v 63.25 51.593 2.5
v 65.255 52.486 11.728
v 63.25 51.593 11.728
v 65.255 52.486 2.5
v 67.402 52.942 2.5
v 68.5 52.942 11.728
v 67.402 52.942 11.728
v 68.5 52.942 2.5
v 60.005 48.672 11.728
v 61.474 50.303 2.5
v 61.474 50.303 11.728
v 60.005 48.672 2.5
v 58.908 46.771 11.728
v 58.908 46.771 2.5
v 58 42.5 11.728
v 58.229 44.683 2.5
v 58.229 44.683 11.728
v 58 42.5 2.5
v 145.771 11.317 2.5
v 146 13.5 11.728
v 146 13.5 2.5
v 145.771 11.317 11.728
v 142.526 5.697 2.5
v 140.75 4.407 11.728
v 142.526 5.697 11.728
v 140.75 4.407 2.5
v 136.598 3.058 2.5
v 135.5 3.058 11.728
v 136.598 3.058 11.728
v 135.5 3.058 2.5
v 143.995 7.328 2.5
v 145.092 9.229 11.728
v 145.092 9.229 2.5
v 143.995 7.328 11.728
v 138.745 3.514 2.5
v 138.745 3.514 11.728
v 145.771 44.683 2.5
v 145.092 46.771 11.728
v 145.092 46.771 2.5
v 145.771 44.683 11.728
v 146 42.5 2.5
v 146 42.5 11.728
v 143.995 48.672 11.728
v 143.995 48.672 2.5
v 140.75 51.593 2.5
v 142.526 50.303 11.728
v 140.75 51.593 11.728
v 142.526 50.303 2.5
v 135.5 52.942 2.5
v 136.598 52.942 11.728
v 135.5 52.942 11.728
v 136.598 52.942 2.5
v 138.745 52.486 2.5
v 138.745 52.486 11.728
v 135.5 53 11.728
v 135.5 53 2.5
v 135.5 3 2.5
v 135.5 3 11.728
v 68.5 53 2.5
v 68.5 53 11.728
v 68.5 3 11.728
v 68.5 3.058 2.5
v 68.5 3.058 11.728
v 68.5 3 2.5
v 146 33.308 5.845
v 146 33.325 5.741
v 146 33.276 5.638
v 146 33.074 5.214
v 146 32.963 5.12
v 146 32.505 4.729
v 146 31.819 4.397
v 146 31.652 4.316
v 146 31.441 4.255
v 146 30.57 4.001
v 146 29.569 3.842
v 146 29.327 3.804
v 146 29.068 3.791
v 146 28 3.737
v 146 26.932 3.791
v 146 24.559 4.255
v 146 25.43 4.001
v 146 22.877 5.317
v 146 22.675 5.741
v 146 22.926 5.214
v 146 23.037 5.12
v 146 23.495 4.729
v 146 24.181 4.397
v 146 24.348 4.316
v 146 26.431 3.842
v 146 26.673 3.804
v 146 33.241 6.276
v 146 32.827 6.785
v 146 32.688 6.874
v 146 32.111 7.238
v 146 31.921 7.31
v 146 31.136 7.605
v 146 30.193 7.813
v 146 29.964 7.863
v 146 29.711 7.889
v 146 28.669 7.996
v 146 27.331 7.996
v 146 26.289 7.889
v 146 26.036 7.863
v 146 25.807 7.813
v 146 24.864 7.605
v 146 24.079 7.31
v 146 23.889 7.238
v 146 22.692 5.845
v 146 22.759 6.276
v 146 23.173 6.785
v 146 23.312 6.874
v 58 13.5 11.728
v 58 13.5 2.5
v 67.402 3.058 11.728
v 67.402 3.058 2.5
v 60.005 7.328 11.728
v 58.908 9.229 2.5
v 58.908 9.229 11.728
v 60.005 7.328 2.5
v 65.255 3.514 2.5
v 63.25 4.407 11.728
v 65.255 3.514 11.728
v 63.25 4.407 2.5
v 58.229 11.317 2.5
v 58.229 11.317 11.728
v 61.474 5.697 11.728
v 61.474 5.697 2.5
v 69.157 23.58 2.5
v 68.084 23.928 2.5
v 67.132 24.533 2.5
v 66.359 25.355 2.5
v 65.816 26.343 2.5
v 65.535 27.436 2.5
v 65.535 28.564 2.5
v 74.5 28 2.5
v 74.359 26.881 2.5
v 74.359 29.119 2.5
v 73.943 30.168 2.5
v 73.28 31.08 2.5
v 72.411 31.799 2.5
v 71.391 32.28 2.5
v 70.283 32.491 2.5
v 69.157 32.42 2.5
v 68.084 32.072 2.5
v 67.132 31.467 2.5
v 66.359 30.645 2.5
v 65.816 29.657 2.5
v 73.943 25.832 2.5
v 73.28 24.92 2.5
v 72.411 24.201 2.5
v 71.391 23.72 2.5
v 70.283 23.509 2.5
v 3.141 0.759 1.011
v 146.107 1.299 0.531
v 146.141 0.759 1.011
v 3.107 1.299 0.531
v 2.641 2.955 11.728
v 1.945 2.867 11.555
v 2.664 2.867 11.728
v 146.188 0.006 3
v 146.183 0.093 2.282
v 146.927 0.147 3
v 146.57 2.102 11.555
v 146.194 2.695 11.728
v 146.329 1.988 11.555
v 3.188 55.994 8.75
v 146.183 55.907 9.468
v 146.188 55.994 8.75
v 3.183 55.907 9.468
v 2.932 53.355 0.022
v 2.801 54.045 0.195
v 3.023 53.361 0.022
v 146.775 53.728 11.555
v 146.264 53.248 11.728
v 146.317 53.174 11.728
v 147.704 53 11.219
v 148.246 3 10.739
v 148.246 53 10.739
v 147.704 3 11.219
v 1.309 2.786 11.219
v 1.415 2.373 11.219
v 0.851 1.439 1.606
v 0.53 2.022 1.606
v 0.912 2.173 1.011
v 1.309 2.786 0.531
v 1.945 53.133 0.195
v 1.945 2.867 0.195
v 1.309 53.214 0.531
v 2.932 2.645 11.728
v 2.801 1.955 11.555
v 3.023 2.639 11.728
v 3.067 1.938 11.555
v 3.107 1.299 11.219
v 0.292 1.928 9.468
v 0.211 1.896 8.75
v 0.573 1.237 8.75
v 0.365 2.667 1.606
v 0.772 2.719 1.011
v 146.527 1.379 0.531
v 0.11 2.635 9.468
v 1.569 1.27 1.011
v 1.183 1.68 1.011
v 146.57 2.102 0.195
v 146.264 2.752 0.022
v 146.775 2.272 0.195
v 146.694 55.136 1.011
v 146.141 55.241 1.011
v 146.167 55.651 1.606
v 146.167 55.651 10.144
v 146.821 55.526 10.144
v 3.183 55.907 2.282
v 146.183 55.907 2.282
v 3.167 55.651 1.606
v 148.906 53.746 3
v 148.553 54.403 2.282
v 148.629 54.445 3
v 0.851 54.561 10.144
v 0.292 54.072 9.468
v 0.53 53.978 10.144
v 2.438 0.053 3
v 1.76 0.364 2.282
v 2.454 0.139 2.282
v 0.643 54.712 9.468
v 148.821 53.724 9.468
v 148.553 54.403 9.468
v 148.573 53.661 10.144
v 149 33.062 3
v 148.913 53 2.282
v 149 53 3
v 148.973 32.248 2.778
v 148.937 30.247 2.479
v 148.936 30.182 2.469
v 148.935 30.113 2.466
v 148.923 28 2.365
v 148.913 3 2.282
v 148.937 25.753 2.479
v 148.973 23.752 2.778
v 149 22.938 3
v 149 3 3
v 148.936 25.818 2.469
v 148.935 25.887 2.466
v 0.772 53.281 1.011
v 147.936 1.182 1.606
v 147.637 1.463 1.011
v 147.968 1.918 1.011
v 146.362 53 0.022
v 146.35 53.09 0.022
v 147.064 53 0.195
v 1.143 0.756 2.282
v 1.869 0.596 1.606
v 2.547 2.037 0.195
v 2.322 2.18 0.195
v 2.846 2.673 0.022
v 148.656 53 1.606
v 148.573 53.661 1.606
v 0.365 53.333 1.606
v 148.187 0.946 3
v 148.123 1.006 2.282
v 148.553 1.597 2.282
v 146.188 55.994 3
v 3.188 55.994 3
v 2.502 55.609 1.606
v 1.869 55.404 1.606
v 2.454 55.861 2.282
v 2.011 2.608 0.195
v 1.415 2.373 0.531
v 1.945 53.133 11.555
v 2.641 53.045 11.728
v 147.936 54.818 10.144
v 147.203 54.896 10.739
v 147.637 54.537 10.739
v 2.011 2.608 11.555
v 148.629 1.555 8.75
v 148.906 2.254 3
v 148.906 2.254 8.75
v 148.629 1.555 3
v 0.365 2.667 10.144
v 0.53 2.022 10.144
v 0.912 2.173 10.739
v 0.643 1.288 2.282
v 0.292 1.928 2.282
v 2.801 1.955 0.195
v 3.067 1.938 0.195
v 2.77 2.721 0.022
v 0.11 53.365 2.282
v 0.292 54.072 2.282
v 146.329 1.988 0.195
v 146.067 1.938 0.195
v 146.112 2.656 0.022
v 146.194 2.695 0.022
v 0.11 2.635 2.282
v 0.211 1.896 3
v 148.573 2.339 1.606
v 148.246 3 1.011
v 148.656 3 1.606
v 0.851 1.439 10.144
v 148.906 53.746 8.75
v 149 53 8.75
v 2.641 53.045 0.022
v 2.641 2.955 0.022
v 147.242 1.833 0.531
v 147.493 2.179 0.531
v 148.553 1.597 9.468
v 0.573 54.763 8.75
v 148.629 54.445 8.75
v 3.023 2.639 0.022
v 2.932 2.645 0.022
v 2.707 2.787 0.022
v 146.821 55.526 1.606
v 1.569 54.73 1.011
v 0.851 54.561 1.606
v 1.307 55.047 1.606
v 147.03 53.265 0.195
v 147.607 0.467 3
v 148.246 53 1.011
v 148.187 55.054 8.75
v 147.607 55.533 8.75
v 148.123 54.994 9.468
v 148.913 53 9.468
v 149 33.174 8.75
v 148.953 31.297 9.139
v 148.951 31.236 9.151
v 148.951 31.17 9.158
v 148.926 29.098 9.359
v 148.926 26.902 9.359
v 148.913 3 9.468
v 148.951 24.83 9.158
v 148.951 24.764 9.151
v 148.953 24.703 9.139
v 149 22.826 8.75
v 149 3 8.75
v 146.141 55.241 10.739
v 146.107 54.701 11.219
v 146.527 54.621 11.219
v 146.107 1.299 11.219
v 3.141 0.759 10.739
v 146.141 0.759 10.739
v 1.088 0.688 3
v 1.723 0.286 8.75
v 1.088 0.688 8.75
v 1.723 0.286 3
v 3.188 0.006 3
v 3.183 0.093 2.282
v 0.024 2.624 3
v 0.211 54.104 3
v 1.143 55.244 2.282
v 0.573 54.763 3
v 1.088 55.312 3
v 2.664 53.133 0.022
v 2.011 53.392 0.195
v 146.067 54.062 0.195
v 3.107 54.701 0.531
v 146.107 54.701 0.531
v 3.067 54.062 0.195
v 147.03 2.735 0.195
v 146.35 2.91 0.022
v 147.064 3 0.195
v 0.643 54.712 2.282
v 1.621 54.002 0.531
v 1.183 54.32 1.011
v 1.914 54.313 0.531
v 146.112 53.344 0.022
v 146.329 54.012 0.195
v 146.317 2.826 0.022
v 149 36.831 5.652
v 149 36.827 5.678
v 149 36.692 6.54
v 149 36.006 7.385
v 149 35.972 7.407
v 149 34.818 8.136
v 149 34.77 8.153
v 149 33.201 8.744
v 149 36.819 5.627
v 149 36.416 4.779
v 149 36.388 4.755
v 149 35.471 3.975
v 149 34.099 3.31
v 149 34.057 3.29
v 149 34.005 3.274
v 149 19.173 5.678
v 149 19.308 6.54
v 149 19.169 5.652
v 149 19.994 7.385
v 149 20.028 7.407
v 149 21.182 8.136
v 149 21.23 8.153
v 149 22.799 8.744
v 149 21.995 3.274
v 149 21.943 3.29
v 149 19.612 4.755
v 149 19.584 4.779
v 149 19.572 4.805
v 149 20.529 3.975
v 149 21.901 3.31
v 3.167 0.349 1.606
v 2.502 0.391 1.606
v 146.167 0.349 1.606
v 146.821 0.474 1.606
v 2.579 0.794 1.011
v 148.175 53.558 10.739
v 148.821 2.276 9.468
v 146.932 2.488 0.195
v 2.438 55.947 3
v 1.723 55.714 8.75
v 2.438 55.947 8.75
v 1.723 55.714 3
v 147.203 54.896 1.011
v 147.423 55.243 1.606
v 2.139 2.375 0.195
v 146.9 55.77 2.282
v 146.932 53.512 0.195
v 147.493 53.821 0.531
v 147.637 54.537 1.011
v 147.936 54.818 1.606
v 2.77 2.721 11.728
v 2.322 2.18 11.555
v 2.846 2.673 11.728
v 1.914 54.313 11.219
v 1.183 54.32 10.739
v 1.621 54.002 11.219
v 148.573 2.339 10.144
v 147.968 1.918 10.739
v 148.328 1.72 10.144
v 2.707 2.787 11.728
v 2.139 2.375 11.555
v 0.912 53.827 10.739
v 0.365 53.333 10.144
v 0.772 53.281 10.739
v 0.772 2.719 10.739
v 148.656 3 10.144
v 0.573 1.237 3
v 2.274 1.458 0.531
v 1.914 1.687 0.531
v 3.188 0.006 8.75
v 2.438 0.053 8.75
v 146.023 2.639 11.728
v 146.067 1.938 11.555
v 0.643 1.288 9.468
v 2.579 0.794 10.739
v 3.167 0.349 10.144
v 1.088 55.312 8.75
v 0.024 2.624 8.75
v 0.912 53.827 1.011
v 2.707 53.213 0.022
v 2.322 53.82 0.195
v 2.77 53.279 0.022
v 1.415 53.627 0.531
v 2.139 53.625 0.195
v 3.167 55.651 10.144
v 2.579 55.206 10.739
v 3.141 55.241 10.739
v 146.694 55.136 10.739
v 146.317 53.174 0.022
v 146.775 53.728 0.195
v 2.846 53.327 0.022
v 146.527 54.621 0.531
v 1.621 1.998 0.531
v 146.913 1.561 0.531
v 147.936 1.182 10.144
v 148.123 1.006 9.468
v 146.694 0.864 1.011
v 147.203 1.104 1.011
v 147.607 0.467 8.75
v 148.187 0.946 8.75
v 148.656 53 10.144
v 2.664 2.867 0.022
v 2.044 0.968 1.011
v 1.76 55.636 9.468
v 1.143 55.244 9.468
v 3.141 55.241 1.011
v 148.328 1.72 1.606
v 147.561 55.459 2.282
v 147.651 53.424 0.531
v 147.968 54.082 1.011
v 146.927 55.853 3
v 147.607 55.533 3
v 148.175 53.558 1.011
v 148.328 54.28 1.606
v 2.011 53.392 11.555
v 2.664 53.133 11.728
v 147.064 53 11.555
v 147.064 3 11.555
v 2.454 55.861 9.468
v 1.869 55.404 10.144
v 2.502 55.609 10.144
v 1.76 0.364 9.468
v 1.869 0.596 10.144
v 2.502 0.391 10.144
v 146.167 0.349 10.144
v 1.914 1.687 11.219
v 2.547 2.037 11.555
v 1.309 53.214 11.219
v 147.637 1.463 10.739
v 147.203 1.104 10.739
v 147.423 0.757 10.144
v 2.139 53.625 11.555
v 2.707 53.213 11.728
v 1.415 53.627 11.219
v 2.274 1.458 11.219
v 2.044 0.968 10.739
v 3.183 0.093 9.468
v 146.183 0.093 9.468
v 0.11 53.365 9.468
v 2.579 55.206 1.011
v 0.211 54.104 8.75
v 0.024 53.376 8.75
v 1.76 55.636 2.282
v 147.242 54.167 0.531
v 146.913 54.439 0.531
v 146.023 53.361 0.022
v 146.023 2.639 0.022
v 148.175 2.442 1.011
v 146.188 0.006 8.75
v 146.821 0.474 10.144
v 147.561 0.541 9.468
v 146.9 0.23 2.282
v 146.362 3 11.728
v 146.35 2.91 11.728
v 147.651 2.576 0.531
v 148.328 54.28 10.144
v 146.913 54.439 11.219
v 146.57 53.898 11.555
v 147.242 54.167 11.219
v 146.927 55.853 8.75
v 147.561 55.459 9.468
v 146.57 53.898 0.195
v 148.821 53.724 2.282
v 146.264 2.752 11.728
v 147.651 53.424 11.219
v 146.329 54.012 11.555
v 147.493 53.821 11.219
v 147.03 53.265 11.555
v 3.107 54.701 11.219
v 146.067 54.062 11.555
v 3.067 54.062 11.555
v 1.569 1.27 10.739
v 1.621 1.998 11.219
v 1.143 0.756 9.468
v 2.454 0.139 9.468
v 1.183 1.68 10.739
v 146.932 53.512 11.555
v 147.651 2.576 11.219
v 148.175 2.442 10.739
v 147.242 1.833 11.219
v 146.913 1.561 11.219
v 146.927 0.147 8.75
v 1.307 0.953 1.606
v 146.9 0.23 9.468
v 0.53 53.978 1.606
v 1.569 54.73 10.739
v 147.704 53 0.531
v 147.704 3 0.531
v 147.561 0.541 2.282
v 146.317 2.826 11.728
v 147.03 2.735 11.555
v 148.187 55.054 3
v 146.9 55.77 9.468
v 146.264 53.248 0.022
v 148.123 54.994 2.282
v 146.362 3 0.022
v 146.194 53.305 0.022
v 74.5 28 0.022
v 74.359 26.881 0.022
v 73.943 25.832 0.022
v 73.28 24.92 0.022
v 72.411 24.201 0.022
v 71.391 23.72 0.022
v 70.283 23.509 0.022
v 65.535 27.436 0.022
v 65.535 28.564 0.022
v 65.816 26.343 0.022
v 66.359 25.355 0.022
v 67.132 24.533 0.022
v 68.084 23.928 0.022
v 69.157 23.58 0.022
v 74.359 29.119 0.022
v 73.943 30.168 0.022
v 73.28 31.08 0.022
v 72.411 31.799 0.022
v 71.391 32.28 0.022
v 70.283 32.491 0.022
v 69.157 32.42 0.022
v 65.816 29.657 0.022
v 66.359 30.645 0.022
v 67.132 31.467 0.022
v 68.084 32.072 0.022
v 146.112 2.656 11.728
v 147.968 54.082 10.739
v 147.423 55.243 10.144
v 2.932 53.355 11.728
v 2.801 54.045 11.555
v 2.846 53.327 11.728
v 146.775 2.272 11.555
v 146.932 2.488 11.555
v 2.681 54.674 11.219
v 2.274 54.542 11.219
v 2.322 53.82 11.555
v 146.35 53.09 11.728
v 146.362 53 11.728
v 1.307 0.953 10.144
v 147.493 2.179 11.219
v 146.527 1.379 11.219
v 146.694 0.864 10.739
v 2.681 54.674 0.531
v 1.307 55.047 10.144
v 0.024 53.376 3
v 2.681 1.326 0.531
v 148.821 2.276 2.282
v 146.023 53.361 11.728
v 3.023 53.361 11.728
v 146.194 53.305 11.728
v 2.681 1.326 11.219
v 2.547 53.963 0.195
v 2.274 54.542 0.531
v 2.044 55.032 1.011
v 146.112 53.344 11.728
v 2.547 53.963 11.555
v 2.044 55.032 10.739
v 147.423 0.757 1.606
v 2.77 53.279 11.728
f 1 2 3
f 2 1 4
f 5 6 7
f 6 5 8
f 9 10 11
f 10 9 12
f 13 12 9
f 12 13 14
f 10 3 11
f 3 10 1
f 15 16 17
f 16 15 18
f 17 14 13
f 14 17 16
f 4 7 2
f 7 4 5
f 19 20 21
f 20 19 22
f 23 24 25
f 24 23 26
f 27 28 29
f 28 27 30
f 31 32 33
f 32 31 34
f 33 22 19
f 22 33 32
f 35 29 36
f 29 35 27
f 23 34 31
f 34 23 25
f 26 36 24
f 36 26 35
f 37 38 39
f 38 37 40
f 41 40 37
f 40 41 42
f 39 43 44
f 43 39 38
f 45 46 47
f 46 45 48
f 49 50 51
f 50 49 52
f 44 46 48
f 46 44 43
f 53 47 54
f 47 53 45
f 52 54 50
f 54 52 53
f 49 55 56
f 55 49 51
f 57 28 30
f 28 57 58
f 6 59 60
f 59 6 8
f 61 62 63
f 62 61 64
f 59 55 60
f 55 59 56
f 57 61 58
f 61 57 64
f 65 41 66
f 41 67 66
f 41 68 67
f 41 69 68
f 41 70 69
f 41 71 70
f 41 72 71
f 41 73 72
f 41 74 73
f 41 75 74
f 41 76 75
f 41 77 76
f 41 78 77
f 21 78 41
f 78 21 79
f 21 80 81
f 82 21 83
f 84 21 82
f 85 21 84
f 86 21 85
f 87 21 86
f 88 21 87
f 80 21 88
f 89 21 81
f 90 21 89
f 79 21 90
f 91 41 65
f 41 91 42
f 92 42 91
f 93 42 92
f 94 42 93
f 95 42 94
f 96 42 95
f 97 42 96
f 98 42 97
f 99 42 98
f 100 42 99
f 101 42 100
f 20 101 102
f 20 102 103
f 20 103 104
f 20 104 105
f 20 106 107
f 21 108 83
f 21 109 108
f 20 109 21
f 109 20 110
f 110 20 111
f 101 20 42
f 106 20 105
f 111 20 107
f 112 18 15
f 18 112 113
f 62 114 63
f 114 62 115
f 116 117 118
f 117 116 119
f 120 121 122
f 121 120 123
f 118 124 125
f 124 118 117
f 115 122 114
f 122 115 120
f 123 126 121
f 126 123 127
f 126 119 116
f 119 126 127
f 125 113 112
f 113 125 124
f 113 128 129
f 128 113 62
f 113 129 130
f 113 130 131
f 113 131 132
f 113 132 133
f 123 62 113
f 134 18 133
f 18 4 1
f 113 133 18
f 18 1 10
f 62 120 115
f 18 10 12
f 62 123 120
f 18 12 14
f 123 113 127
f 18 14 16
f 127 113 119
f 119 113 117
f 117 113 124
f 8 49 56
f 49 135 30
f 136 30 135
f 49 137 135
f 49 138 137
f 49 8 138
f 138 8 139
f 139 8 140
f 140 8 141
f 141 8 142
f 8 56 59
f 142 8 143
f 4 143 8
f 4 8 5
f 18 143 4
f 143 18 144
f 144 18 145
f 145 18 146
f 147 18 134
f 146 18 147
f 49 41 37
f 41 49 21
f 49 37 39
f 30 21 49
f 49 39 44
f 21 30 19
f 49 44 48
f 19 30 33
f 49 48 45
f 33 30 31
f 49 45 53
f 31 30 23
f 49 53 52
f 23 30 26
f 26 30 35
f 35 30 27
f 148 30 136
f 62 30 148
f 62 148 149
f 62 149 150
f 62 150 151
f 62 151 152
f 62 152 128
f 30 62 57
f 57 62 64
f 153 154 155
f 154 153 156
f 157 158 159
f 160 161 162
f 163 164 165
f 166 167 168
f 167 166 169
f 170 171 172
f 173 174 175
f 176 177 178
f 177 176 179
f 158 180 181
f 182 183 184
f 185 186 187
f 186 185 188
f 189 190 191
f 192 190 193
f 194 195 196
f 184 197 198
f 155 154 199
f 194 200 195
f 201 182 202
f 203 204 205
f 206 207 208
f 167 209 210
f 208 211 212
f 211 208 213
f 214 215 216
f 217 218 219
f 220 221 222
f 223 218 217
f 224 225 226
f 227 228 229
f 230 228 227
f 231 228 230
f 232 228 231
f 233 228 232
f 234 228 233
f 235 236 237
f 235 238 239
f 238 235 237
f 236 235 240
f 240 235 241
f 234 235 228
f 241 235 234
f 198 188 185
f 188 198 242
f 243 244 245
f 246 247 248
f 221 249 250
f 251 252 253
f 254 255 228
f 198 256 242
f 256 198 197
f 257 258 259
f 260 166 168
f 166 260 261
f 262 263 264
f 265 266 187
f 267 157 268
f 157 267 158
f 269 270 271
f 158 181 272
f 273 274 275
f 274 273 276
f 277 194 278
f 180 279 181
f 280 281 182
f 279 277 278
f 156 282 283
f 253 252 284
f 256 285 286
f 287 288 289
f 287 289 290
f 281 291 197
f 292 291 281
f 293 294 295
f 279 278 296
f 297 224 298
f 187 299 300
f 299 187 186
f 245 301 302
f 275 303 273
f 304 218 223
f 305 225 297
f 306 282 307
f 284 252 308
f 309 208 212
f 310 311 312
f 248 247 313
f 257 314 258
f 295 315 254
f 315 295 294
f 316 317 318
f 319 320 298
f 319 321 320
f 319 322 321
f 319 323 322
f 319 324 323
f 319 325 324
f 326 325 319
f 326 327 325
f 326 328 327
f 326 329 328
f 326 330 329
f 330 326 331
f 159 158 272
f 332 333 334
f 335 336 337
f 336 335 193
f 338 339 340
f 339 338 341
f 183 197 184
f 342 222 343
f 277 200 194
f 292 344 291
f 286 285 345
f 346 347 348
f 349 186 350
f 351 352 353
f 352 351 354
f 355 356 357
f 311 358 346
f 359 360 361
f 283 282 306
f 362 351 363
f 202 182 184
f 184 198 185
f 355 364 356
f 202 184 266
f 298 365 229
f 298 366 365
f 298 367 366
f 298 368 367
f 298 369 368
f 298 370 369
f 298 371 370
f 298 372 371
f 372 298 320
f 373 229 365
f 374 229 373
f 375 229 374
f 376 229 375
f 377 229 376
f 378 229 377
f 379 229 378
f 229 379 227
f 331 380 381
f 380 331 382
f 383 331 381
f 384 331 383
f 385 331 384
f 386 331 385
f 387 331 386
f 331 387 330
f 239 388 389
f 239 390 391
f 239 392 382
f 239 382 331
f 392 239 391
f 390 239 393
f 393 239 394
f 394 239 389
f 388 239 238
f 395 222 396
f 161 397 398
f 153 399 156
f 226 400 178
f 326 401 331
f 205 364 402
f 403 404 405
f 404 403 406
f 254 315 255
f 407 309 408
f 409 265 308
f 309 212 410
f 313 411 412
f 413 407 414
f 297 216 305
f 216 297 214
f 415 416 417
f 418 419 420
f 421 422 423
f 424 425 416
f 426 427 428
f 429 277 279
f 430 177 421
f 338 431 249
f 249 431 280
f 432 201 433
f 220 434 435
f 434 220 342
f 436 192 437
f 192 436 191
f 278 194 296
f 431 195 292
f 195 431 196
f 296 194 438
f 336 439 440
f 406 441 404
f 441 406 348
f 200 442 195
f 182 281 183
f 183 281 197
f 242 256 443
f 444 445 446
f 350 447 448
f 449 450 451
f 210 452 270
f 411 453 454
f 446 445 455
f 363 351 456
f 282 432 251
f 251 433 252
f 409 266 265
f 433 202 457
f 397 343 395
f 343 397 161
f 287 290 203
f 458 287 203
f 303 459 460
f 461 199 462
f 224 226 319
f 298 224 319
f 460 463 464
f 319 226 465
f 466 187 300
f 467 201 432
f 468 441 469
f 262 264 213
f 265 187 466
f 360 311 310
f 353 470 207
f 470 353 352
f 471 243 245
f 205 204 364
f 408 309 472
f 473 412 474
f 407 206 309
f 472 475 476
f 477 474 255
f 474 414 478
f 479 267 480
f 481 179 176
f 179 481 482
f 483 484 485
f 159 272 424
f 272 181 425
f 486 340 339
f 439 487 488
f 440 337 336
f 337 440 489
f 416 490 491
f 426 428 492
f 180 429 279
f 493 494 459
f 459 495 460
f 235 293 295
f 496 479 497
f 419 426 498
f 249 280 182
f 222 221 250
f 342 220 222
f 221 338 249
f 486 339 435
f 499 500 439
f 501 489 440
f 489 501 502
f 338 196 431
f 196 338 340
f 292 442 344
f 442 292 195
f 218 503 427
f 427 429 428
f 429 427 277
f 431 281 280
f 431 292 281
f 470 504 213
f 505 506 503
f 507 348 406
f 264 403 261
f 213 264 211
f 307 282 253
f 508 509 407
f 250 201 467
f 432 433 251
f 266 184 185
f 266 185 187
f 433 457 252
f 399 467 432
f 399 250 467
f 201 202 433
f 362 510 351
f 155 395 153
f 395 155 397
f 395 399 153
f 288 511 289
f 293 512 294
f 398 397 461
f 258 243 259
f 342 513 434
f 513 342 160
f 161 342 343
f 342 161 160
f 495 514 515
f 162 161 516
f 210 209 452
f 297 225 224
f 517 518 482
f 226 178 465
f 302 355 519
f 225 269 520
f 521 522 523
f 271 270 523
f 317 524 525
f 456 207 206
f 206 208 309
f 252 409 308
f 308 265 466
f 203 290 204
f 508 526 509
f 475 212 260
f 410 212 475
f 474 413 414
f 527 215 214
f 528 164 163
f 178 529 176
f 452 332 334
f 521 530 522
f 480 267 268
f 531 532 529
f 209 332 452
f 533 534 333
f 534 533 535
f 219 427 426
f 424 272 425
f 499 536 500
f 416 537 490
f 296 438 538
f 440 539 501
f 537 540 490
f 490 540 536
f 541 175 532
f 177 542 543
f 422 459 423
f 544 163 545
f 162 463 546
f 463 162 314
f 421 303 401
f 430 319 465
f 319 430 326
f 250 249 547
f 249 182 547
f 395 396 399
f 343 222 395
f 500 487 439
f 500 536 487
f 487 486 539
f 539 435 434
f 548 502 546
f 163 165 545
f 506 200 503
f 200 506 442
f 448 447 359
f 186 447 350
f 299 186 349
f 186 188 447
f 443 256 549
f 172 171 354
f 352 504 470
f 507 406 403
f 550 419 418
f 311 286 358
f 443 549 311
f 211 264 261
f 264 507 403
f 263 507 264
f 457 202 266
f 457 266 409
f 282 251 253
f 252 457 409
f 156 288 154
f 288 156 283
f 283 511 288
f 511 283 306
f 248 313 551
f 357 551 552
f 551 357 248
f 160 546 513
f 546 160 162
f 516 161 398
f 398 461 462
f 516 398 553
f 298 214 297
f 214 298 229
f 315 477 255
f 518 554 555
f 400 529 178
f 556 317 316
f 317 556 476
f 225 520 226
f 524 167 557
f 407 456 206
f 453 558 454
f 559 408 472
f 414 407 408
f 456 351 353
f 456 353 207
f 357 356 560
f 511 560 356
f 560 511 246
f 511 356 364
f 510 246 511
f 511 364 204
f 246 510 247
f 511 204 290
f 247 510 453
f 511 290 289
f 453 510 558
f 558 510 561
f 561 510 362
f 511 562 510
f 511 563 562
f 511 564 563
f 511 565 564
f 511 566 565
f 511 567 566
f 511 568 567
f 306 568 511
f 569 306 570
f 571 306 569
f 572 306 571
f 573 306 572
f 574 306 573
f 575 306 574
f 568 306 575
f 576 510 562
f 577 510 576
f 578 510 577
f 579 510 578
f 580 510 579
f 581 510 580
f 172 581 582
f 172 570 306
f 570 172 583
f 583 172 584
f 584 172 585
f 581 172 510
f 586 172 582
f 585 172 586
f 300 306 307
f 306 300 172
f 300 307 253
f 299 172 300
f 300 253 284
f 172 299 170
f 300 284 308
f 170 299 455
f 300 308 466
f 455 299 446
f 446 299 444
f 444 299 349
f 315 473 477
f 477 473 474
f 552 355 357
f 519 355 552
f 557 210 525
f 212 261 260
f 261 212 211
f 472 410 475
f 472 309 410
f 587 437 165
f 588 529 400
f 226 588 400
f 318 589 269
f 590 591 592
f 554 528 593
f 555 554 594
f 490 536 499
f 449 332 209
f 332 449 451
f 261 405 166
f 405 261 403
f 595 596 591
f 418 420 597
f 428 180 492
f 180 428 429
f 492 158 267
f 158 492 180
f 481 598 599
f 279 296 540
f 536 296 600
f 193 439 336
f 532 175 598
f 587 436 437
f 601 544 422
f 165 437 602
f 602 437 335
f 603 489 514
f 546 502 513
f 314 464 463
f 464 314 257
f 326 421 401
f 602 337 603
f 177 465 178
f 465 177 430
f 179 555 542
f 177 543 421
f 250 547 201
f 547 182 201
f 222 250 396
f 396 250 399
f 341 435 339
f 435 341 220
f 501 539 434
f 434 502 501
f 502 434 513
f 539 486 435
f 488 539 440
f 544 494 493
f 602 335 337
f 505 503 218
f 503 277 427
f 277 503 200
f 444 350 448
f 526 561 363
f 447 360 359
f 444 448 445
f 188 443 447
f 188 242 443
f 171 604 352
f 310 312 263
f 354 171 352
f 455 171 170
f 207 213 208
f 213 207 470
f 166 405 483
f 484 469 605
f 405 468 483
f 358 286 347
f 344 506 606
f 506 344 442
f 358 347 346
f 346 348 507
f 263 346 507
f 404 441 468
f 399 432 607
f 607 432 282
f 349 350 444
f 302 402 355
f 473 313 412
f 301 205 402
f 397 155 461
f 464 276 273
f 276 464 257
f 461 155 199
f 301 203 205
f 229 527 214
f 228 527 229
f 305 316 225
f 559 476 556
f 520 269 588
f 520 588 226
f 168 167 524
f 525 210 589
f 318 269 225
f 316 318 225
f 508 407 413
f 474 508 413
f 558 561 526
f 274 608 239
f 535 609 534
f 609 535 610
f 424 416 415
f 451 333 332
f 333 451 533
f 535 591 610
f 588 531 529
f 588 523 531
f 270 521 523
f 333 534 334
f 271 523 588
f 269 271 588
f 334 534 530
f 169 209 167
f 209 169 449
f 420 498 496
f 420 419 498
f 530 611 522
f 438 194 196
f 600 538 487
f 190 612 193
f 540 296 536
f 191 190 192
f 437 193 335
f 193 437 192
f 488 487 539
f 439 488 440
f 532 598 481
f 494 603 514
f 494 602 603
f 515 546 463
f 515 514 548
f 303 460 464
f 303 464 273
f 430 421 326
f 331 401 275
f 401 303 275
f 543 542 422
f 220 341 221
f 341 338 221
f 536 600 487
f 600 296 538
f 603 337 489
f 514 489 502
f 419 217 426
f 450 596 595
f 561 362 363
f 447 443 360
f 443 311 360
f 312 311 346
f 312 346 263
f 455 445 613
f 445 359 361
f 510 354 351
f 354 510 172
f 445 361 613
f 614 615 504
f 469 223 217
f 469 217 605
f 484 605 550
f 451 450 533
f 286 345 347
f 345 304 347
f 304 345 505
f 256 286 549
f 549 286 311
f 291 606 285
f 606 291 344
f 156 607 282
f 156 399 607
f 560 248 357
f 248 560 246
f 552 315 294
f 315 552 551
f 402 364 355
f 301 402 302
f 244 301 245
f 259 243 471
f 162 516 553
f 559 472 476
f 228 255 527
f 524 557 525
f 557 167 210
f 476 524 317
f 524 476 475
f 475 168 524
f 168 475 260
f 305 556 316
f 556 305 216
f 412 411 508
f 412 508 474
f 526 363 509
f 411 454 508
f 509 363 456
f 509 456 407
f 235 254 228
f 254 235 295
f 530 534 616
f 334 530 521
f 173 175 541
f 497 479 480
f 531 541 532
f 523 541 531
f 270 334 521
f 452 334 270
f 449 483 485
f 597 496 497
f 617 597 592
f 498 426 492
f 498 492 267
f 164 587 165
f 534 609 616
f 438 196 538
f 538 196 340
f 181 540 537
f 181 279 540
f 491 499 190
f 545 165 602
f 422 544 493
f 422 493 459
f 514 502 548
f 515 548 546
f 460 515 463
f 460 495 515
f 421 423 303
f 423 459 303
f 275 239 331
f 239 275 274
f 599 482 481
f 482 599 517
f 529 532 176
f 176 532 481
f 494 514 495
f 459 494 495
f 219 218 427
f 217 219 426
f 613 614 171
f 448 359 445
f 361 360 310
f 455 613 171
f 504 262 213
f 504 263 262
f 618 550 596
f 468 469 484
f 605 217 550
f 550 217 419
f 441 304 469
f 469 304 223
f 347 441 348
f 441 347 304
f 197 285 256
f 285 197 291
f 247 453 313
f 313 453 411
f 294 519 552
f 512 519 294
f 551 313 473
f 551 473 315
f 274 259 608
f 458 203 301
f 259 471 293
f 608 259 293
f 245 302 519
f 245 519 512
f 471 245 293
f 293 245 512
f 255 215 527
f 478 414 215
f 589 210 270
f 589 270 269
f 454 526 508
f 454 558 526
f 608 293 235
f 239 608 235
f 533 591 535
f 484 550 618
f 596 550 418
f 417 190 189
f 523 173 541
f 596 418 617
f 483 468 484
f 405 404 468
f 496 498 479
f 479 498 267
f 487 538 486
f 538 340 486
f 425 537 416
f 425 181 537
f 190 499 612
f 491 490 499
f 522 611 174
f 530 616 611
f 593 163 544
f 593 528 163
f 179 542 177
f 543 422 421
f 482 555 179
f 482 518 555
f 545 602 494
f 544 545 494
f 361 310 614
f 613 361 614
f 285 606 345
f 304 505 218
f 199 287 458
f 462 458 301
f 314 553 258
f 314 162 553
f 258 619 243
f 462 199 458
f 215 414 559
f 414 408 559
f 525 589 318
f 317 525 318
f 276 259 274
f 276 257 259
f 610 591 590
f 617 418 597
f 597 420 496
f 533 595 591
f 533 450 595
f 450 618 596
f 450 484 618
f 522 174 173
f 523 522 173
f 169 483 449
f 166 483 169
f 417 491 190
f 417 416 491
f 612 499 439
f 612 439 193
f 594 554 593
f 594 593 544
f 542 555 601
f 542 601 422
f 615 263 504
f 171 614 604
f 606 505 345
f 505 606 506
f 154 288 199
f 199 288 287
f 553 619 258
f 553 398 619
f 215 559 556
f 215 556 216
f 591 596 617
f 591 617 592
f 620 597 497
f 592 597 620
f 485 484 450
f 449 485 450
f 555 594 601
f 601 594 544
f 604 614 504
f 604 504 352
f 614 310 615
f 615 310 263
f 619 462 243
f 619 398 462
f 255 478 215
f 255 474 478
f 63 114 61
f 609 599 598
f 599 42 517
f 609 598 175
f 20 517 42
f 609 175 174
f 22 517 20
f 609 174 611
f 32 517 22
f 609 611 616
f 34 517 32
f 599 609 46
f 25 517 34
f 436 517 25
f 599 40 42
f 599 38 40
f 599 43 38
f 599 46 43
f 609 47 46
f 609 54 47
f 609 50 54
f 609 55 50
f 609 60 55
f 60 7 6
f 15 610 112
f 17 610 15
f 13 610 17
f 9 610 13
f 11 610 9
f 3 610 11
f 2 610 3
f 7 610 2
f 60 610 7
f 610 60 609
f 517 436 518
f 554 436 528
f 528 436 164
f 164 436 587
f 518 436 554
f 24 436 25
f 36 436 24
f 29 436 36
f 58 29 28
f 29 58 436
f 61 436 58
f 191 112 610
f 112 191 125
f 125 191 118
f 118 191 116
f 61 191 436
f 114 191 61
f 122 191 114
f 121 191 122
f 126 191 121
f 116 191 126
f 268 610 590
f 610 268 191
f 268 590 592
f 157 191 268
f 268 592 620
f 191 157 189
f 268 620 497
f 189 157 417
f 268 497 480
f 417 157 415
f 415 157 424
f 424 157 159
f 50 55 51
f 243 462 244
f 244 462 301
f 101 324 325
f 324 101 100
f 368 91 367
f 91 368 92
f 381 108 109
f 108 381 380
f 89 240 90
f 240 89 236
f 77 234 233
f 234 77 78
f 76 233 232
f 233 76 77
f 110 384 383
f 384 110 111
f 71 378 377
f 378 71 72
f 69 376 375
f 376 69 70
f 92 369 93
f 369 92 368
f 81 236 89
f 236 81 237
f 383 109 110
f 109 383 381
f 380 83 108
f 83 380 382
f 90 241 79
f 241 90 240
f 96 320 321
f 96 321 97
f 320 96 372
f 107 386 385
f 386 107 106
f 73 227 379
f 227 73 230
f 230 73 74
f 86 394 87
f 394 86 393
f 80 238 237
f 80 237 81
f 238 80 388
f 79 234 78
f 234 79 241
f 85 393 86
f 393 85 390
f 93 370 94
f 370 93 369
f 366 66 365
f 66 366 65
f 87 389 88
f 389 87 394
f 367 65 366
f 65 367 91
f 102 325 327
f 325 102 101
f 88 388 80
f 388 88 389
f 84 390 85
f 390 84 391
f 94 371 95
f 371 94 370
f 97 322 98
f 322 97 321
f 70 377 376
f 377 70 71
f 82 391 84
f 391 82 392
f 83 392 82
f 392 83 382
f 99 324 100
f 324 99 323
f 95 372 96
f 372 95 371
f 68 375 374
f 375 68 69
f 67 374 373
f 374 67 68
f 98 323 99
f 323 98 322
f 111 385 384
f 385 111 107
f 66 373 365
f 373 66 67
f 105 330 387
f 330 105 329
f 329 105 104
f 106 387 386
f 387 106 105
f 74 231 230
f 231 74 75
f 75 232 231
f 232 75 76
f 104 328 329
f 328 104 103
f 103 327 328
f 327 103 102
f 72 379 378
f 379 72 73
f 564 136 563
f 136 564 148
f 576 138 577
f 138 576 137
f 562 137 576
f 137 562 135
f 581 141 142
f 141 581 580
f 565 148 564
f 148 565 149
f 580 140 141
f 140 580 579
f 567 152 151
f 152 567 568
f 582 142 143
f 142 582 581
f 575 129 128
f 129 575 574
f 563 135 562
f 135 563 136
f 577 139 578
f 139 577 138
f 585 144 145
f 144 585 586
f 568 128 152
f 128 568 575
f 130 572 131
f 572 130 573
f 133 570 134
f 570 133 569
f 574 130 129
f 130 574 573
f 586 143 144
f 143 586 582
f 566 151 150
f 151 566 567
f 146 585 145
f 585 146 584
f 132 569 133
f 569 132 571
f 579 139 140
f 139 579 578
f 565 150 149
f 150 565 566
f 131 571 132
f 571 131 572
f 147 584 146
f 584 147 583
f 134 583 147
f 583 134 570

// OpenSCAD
// production quality or not
production = 0;

$resolution = production ? 150 : 25;

if (production) {
    echo("Producing PRODUCTION quality");
    echo("Resolution",$resolution);
} else {
    echo("Producing DRAFT quality");
    echo("Resolution",$resolution);
}

remote_depth = 5.75;
remote_width = 50;
remote_height = 88;
remote_extra = 55;
round_radius = 3;

inner_round_radius = 10.5;
ir_gap = 7;

thickness = 2;


module remote_basic() {
	cube([
		remote_height
		, remote_width
		, remote_depth
		]);
}

// round the corners of the remote
module remote() {
	difference() {
		remote_basic();

		difference() {
			remote_basic();

			// lower right
			translate([
				inner_round_radius
				, inner_round_radius
				, 0]) {
				cylinder(
					h = remote_depth
					, r = inner_round_radius
				);
			}

			union() {
				// lower left
				translate([
					inner_round_radius
					, remote_width - inner_round_radius
					, 0]) {
					cylinder(
						h = remote_depth
						, r = inner_round_radius
					);
				}

				// upper right
				translate([
					remote_height - inner_round_radius
					, inner_round_radius
					, 0]) {
					cylinder(
						h = remote_depth
						, r = inner_round_radius
					);
				}

				// lower left
				translate([
					remote_height - inner_round_radius
					, remote_width - inner_round_radius
					, 0]) {
					cylinder(
						h = remote_depth
						, r = inner_round_radius
					);
				}

				// x-axis remove
				translate([
					inner_round_radius
					, 0
					, 0
					]) {
					cube([
						remote_height - (inner_round_radius*2)
						, remote_width
						, remote_depth
						]);
				}

				// y-axis remove
				translate([
					0
					, inner_round_radius
					, 0
					]) {
					cube([
						remote_height
						, remote_width - (inner_round_radius*2)
						, remote_depth
						]);
				}
			}
		}
	}
}

difference() {

	// outer shell
	color([
			.7
			,.9
			,.9
		])
	minkowski() {
		cube([
			remote_height + remote_extra
			, remote_width
			, remote_depth
			]);
		translate([
			round_radius
			, round_radius
			, round_radius]) {
			sphere(r = round_radius
				   , $fn=$resolution);
		}
	}

	// remote gap
	union() {
		translate([
			remote_extra + round_radius
			, round_radius
			, remote_depth+1
			]) {
			color([.9,.9,.9]) {
				remote();
			}
		}

		translate([
			remote_extra + round_radius
			, round_radius
			, thickness+.5
			]) {
			color([.9,.9,.9]) {
				remote();
			}
		}
	}

	// IR gap
	translate([
		remote_height+remote_extra
		, ((remote_width+(thickness*2))/2)+1
		, (remote_depth+(round_radius*2))/2
		]) {
		//cube([ir_gap,ir_gap,ir_gap]);
		rotate([0,90,0]) {
			resize([8,20,0]) {
			cylinder(
					 h = ir_gap
					 , r1 = 1
					 , r2 = (ir_gap/2)+2
					 , $fn = $resolution
					 );
			}
		}
	}

	// Remote release hole
	translate([
		remote_extra + 15
		, ((remote_width+(thickness*2))/2)+1
		, 0-(ir_gap/2)
		]) {
		cylinder(
				 h = 10
				 , d = ir_gap+2
				 , $fn = $resolution
				 );
	}

/*
	union() {
		translate([
			30
			, 17
			, -6.9
			]) {
			mirror() {
				rotate([0,0,90]) {
					linear_extrude(4) {
						text("NWS"
							 , size=5
							 , font = "Calisto MT");
					}
				}
			}
		}

		translate([
			22
			, 19
			, -6.9
			]) {
			mirror() {
				rotate([0,0,90]) {
					linear_extrude(4) {
						text("2018"
							 , size = 5
							 , font = "Calisto MT");
					}
				}
			}
		}
	}
*/

}
